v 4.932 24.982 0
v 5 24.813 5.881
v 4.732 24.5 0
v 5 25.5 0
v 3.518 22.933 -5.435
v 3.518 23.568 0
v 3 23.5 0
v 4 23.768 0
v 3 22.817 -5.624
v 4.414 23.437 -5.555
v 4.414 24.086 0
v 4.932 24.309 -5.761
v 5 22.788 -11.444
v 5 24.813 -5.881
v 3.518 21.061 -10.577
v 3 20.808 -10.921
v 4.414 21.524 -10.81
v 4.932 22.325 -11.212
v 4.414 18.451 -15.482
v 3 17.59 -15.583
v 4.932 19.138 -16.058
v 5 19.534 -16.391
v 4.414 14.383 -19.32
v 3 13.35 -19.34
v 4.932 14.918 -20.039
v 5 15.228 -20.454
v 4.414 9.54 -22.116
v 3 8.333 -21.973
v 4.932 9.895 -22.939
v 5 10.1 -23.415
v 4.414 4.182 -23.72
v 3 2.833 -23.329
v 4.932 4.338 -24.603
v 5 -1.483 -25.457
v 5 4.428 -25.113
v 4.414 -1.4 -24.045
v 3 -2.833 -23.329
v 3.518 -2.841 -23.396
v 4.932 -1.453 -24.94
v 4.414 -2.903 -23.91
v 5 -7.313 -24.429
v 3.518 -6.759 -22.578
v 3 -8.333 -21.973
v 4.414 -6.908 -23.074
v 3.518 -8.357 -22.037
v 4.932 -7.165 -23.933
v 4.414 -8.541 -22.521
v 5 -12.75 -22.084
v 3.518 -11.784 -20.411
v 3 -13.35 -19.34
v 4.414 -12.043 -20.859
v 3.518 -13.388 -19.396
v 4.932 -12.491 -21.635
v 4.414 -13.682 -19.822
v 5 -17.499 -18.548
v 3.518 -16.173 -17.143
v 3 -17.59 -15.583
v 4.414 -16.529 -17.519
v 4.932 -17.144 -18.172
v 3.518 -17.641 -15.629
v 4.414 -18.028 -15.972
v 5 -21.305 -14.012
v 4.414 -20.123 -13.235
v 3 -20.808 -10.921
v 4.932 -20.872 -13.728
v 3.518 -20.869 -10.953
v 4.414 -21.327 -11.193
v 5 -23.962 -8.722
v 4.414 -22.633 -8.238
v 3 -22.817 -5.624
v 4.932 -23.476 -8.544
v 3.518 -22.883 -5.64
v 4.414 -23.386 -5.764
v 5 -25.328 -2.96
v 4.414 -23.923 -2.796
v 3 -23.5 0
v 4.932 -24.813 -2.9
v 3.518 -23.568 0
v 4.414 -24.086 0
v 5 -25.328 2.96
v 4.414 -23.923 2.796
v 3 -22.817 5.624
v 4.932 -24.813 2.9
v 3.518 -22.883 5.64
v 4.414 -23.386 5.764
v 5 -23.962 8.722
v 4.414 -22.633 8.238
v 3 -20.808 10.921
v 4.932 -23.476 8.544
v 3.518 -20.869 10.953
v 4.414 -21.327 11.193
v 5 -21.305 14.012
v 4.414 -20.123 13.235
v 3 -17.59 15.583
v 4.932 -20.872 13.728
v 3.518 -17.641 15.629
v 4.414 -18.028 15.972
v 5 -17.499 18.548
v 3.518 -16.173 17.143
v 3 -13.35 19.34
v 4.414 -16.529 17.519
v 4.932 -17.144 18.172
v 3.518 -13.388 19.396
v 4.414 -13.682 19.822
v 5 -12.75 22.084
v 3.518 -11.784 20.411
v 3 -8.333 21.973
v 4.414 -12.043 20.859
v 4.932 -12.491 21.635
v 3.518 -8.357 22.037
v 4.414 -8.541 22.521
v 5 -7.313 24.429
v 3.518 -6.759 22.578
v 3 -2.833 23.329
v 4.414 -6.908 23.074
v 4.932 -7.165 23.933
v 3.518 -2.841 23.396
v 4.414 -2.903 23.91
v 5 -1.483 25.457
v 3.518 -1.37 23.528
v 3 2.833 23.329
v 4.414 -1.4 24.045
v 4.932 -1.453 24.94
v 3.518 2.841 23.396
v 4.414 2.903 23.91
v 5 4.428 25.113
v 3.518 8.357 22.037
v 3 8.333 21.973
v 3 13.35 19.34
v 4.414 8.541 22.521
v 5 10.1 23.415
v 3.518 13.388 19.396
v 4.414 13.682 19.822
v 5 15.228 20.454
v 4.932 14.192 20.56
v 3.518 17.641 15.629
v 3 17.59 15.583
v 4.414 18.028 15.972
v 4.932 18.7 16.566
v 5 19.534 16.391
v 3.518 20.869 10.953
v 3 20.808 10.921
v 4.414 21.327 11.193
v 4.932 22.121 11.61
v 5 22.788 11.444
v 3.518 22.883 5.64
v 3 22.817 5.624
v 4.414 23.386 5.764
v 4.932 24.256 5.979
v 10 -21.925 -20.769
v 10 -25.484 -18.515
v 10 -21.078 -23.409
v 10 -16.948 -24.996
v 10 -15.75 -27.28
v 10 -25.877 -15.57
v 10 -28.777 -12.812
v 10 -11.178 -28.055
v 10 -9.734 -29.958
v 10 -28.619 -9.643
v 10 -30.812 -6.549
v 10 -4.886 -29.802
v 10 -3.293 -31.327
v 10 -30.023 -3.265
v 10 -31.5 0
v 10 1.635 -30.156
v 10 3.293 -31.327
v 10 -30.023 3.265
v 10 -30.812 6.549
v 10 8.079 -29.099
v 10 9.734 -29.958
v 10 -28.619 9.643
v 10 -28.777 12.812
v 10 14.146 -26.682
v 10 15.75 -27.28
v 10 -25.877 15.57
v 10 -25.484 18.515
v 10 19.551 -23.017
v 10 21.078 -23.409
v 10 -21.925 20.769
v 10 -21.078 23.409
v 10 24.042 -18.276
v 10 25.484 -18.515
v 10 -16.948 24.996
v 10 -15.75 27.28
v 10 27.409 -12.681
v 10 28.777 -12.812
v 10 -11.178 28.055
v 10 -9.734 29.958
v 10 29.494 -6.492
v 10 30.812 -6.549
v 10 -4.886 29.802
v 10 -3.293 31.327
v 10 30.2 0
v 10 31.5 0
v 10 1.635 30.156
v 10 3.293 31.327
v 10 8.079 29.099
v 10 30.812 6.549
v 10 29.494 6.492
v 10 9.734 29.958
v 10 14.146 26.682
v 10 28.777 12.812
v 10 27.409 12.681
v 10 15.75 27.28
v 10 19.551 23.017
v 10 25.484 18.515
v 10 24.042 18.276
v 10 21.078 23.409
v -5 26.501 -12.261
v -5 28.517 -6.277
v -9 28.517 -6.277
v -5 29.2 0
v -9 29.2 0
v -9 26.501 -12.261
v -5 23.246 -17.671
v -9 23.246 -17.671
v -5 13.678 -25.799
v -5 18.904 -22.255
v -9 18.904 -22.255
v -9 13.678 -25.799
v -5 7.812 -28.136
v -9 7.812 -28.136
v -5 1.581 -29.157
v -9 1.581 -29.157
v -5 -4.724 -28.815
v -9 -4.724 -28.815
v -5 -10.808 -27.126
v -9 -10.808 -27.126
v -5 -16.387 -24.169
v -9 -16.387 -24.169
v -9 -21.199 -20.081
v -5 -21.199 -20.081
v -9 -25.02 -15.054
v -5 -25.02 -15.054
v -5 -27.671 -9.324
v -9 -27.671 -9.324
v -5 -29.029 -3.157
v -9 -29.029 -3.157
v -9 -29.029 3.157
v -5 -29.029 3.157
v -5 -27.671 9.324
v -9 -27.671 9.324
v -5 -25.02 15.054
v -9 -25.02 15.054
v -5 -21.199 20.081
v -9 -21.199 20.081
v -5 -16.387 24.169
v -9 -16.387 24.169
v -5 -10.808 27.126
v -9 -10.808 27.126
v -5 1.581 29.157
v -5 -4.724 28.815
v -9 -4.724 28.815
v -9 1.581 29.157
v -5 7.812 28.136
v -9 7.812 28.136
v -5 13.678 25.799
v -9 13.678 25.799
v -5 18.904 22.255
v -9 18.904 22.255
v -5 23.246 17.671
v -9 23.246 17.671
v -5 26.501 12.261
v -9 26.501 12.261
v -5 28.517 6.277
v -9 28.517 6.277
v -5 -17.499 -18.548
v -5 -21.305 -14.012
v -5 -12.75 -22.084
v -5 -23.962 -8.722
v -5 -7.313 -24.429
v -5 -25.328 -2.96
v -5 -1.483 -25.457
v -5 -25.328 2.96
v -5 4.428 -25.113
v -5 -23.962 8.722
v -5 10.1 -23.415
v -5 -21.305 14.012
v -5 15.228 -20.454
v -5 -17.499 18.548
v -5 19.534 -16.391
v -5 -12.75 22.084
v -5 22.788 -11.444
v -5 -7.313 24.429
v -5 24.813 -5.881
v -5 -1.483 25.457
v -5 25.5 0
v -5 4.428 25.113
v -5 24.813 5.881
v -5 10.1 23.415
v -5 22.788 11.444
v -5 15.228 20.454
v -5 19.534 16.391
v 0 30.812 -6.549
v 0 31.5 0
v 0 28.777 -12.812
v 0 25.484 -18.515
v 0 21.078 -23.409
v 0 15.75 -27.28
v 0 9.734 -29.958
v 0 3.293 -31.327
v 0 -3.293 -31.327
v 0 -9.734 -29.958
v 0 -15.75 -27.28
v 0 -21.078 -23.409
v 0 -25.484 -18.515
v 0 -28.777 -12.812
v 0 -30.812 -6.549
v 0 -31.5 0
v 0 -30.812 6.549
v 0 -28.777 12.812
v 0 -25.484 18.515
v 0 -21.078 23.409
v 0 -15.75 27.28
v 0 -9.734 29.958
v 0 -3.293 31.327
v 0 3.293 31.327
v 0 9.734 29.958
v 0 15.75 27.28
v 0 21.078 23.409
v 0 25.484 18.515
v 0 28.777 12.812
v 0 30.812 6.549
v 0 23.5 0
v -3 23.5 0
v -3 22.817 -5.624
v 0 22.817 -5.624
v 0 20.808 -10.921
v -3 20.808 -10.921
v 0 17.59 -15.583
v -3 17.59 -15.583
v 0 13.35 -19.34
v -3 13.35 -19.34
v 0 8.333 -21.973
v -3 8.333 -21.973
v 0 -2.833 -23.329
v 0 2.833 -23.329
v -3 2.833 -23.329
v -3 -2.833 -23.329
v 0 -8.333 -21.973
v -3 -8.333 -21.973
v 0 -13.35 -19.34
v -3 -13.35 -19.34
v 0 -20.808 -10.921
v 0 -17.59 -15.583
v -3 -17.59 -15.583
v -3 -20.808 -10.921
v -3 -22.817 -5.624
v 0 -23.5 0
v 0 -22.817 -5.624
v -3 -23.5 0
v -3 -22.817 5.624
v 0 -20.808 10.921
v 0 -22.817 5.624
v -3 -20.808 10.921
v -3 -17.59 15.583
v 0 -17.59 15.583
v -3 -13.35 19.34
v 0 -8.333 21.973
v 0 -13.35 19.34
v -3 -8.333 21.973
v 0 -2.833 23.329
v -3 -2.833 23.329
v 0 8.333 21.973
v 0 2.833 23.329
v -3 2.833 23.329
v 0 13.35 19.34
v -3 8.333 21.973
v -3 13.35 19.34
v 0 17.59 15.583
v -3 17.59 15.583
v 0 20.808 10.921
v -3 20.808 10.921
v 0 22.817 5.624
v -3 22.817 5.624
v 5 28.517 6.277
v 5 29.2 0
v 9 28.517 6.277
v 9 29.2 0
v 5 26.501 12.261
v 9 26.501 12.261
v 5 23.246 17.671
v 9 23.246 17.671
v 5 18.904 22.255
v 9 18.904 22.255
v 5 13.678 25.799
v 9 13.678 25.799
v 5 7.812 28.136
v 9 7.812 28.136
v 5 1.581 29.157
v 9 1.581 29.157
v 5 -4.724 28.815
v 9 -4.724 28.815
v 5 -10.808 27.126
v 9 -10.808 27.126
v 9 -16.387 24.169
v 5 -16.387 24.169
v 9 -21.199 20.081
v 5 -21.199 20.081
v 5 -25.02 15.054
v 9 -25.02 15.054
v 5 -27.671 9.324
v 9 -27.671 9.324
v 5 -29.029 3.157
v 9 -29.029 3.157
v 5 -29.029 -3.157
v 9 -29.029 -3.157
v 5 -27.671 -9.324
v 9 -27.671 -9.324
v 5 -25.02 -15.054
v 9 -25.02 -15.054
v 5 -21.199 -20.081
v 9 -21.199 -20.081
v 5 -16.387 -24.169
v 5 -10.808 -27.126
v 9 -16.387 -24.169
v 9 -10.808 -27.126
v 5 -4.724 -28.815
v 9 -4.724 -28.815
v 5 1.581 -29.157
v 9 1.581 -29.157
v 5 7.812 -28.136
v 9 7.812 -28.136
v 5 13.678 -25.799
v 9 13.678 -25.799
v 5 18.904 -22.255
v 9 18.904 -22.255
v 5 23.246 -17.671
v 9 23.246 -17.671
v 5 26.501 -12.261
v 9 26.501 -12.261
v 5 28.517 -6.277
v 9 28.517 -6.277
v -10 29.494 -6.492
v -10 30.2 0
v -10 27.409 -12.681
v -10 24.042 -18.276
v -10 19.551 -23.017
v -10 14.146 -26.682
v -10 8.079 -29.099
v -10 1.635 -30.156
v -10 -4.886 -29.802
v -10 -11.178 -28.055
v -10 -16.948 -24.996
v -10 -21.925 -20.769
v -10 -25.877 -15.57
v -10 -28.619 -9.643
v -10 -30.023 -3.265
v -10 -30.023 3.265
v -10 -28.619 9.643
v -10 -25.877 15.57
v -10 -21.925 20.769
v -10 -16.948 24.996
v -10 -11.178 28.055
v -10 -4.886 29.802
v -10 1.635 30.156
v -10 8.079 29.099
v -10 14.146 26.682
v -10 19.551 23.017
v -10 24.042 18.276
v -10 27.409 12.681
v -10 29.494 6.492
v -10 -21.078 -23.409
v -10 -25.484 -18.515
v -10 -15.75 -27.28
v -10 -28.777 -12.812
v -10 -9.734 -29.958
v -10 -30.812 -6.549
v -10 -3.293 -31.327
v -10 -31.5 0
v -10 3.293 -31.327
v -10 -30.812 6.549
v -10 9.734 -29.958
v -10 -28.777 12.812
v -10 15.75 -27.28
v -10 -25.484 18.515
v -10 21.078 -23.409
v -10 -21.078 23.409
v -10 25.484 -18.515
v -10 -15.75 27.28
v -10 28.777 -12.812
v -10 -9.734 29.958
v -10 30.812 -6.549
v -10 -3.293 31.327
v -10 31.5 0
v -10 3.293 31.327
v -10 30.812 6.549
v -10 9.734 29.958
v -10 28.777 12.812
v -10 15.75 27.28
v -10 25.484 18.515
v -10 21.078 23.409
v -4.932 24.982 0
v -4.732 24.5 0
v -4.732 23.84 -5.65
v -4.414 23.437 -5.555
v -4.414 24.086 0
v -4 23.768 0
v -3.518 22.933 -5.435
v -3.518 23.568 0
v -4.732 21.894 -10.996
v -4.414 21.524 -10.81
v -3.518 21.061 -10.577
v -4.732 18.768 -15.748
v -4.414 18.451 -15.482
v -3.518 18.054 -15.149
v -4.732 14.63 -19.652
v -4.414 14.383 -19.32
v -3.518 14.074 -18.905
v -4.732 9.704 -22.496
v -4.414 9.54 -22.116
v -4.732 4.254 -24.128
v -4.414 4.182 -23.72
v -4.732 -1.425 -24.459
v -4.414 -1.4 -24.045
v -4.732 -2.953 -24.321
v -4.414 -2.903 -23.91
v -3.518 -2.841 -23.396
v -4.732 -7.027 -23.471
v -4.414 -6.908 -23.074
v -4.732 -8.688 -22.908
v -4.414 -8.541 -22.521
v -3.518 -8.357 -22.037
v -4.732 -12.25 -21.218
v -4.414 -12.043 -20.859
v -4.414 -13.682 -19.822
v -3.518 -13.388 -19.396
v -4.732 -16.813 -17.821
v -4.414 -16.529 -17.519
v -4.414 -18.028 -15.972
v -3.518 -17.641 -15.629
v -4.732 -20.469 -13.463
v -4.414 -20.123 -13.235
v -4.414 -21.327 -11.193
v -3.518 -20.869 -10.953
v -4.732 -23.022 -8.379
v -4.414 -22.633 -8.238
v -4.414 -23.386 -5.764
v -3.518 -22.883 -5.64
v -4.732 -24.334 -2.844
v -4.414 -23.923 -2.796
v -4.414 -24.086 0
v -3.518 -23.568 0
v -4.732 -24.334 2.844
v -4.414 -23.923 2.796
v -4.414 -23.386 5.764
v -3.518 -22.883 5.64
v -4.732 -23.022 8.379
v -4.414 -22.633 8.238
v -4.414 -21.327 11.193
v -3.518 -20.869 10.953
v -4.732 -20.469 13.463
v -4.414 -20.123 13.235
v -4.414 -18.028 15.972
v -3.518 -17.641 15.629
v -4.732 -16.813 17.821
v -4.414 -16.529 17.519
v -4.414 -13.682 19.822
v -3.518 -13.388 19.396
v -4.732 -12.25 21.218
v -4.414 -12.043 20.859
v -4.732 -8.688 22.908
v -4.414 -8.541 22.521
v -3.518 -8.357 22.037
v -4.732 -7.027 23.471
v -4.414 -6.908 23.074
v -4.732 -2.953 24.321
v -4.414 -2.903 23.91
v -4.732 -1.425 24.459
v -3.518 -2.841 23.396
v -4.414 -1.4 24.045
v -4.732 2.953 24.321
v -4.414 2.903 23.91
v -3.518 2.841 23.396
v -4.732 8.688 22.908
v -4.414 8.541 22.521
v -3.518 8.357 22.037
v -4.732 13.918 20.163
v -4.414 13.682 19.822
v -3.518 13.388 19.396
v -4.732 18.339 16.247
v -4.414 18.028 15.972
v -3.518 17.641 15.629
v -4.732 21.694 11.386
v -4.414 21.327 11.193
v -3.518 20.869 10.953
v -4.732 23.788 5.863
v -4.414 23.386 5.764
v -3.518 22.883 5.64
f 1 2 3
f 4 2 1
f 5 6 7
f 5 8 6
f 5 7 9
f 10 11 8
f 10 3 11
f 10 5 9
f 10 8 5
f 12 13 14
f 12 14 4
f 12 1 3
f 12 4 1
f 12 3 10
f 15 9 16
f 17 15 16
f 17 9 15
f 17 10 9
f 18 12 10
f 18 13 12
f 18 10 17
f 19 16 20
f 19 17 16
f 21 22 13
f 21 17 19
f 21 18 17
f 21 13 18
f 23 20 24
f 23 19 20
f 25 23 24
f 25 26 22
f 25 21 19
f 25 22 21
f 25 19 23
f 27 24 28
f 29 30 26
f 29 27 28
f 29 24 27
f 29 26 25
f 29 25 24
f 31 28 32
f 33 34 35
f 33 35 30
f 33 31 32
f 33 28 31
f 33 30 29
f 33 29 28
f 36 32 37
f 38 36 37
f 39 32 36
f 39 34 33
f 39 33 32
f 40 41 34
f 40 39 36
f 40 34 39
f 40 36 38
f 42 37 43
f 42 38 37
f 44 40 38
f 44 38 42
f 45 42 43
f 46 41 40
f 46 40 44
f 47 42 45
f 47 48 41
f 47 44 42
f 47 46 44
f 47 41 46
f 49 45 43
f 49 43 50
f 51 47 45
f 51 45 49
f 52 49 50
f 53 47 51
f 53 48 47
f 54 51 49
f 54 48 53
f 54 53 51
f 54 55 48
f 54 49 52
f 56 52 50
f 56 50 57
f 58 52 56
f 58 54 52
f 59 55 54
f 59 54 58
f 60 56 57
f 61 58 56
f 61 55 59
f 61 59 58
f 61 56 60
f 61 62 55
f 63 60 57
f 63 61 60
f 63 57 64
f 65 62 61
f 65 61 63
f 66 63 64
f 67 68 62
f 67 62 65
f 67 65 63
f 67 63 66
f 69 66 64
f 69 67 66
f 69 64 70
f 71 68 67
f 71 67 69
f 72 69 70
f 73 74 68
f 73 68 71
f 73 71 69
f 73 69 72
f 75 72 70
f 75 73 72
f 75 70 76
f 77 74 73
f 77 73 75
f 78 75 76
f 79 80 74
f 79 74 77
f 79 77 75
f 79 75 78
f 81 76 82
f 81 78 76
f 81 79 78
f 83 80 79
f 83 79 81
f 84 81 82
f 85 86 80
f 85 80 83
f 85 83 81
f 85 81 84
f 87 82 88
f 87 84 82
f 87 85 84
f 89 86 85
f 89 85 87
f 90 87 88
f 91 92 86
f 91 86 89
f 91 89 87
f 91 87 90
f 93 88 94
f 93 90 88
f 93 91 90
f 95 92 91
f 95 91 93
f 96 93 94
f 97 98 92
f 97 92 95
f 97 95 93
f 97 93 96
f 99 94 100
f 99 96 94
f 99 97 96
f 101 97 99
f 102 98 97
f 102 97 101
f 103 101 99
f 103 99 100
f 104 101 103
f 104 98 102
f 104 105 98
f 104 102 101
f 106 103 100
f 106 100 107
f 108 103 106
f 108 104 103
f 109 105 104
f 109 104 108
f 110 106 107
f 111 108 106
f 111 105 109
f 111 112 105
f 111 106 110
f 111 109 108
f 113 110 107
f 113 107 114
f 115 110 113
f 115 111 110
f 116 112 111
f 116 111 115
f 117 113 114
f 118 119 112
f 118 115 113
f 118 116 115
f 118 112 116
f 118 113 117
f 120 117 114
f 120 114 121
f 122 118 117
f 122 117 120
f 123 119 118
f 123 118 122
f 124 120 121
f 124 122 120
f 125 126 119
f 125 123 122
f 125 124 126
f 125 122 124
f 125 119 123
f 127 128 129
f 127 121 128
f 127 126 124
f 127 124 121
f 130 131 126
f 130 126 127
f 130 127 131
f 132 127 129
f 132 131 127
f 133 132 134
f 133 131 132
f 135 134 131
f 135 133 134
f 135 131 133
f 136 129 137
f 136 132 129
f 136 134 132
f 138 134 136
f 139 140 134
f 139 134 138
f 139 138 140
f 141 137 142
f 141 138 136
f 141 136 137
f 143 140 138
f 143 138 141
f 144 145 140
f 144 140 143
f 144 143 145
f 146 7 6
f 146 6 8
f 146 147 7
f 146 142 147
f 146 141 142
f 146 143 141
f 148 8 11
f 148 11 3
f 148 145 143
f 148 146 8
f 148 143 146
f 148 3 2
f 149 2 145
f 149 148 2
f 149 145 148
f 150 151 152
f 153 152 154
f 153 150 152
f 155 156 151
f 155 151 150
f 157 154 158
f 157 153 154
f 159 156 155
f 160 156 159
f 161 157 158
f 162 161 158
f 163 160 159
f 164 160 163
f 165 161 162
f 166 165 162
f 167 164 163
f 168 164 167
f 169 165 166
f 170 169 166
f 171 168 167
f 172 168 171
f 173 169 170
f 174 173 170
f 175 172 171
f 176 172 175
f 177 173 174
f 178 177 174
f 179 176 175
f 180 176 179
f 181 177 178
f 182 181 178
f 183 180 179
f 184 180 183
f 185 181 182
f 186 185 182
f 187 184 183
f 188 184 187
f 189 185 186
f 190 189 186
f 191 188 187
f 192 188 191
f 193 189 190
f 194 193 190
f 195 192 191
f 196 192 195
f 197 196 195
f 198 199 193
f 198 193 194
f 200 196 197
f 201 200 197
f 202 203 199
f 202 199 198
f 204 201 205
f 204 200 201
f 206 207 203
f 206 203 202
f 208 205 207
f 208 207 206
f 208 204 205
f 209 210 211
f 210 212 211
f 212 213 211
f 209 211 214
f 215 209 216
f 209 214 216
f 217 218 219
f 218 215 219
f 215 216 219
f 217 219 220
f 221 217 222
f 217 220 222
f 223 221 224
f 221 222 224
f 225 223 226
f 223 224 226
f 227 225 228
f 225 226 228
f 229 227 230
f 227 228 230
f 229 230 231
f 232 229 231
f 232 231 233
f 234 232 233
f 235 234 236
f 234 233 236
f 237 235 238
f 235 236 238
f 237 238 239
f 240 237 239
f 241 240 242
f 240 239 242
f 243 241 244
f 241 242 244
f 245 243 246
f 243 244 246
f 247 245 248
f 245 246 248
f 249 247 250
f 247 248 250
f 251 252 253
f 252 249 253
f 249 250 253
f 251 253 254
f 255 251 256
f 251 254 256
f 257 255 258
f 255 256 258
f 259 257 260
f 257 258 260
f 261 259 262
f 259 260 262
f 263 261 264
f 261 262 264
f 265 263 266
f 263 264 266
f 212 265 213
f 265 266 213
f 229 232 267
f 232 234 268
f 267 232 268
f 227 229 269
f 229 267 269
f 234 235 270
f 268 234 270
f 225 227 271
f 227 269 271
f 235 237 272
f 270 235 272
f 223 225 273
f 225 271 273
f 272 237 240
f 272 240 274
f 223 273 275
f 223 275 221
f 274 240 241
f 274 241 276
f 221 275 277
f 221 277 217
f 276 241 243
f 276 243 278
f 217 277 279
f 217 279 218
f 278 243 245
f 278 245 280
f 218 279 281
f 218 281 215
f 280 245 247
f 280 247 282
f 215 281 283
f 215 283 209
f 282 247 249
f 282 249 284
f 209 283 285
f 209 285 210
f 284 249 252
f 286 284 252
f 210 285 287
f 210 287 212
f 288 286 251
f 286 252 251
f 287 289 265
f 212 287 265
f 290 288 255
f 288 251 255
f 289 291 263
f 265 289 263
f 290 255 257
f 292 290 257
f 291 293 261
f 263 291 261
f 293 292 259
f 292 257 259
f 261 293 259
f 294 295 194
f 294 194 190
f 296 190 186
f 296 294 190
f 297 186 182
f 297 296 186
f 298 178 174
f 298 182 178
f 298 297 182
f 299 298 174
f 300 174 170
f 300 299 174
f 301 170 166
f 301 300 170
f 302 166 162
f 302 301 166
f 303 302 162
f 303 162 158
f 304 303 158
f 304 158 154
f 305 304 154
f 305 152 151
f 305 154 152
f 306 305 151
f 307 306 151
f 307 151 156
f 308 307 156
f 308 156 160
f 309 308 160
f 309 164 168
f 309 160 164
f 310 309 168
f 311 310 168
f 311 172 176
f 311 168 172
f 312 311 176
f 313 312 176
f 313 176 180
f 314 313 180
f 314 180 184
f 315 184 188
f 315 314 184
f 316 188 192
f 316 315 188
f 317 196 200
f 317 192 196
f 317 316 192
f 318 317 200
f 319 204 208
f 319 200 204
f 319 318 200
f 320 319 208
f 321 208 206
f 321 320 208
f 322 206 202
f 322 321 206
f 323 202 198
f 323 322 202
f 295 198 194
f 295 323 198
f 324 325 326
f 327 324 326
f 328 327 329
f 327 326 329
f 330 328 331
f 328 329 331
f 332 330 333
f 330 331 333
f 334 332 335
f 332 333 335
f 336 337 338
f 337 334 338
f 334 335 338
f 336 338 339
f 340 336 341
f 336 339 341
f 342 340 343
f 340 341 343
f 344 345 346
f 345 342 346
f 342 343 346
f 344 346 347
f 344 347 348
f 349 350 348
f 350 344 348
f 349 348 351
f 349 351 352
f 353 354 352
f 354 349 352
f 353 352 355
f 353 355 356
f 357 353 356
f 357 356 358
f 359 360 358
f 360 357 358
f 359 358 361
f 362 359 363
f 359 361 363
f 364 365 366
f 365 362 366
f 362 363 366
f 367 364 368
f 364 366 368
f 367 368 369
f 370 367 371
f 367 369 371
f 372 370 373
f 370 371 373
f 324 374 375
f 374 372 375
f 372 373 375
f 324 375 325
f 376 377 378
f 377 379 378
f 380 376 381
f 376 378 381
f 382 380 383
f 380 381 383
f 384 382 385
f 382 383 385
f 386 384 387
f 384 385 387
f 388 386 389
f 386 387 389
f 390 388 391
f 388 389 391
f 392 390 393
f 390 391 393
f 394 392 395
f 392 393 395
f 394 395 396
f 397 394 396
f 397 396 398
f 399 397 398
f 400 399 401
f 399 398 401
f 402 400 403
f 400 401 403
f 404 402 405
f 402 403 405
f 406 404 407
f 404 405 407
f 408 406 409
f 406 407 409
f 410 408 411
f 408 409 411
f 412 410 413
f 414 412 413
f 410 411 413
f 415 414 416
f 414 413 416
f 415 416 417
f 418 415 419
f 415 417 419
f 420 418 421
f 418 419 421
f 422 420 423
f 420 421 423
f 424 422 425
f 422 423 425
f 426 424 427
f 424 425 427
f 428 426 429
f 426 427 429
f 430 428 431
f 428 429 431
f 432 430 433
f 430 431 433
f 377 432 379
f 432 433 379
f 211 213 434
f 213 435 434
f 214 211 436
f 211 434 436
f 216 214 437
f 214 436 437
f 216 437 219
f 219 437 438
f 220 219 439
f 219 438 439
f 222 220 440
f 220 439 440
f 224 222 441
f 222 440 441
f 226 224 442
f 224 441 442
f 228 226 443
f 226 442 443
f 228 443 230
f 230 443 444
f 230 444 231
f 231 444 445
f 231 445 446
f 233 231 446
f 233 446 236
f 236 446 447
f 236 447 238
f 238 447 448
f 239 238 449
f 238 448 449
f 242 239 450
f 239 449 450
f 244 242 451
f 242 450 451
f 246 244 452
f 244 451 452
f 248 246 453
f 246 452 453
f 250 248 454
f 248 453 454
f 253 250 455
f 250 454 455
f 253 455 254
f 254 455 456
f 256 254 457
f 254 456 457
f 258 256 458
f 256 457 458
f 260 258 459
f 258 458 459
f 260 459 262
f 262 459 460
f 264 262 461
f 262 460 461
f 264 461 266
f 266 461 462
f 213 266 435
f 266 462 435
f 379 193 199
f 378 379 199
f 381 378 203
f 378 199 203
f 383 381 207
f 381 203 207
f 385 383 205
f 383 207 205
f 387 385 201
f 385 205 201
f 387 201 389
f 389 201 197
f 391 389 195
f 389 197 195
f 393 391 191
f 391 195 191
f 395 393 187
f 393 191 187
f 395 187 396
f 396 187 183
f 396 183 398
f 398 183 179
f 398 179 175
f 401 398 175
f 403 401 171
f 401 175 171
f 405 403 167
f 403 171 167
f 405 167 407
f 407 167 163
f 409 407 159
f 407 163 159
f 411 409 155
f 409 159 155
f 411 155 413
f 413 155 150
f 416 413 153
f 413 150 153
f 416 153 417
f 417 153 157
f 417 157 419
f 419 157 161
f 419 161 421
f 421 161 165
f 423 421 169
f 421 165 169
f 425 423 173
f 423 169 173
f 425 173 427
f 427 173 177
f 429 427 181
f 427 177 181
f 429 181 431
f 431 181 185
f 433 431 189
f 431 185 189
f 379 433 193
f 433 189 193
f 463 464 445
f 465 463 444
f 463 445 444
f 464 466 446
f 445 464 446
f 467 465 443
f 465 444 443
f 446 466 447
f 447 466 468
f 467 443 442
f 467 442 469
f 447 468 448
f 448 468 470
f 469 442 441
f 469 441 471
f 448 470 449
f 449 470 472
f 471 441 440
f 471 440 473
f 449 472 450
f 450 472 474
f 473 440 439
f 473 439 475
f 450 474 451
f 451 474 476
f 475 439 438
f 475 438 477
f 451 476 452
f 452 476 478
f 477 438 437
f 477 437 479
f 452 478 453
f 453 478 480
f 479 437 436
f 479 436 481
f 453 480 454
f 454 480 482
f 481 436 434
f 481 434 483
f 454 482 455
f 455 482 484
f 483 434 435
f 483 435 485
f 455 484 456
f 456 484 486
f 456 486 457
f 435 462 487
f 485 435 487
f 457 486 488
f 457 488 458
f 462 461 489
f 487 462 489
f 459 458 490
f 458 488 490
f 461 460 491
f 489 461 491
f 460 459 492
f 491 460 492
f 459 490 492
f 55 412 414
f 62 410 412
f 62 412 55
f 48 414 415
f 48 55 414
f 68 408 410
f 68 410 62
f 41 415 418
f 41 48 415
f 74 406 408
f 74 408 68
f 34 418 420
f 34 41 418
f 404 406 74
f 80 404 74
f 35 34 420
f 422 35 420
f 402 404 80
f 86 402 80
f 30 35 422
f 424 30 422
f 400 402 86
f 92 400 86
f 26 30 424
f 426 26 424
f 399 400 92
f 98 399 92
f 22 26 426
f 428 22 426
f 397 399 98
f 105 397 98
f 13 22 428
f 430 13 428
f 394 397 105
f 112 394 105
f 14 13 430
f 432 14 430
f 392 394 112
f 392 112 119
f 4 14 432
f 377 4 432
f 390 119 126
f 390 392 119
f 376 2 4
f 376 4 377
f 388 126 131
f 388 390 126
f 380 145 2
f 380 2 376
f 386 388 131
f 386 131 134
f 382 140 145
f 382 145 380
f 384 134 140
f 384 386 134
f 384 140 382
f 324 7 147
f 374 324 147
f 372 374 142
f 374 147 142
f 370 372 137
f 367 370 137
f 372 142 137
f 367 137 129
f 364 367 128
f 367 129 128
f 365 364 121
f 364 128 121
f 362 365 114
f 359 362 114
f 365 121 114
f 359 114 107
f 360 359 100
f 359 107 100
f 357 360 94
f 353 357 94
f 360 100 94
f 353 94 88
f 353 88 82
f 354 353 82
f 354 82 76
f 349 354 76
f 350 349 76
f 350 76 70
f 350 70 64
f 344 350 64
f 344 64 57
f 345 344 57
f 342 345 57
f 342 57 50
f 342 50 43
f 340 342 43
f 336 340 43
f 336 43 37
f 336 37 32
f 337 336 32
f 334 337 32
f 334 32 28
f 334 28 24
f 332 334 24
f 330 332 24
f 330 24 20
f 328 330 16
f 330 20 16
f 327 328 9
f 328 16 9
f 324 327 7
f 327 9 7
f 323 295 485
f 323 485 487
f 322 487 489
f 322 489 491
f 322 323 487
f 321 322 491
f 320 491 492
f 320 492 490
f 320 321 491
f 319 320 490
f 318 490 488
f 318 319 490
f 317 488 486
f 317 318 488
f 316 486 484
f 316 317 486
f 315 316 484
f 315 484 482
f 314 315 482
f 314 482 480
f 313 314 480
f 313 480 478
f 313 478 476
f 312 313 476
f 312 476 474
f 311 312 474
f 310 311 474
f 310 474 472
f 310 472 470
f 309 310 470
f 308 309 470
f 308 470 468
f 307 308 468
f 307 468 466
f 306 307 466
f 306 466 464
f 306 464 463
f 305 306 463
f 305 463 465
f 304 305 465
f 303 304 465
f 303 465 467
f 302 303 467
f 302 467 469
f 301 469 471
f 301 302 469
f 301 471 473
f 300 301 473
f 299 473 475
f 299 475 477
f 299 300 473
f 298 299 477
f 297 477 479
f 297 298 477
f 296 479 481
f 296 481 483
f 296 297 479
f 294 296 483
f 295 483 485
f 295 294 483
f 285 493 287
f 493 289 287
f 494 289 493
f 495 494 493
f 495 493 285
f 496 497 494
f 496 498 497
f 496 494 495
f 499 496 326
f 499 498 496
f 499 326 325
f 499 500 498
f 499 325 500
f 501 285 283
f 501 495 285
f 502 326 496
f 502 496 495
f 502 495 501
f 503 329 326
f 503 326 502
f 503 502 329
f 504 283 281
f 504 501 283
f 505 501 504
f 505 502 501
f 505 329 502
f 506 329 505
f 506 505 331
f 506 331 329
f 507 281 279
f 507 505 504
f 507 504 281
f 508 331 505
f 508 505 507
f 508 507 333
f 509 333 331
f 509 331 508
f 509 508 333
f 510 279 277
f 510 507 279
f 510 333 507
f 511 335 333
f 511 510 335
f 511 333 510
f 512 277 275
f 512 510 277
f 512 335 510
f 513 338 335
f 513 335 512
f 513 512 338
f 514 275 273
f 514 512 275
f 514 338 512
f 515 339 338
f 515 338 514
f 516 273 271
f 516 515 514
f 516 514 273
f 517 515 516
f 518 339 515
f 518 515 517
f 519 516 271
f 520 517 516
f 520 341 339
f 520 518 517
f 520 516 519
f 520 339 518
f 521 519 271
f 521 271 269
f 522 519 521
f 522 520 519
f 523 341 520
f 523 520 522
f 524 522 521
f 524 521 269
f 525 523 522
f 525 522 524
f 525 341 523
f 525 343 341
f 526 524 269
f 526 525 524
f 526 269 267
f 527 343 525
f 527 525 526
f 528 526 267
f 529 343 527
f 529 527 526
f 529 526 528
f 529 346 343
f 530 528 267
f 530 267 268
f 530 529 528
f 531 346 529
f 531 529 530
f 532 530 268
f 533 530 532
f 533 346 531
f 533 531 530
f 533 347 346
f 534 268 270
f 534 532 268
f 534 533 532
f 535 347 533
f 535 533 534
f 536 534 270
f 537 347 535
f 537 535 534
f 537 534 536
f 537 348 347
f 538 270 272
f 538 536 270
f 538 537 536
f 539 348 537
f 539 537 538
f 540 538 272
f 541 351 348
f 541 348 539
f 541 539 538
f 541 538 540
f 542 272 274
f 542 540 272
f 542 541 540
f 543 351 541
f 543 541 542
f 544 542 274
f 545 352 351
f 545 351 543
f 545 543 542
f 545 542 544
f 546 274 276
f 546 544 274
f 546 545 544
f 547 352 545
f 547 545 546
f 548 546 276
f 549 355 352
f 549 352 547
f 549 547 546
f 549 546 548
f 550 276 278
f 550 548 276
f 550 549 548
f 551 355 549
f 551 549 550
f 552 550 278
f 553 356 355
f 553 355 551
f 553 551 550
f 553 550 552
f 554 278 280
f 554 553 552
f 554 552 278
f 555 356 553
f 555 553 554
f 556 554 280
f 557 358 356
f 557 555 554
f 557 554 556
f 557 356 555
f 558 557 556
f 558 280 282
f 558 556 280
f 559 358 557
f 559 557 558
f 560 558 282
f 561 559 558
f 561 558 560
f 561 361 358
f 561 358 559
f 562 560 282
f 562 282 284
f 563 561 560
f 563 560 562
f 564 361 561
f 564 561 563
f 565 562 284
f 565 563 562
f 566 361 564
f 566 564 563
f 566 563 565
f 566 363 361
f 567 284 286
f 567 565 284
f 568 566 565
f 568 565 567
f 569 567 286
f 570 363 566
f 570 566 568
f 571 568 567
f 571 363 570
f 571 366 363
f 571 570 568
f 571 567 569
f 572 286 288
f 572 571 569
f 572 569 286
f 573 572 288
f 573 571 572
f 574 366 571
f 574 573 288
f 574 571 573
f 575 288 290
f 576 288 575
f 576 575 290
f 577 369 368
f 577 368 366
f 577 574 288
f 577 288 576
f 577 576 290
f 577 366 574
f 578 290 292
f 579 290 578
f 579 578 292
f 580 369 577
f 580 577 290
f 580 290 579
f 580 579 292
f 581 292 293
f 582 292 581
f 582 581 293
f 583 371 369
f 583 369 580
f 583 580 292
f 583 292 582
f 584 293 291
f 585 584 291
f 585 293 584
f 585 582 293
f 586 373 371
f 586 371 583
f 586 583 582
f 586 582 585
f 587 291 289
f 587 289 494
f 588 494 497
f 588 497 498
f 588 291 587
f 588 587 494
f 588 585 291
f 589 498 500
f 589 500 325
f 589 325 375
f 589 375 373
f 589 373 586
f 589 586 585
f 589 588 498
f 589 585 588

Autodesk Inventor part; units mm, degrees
ref_plane "YZ Plane" through (0, 0, 0) normal (1, 0, 0) x (0, 1, 0)
ref_plane "XZ Plane" through (0, 0, 0) normal (0, 1, 0) x (-1, 0, 0)
ref_plane "XY Plane" through (0, 0, 0) normal (0, 0, 1) x (1, 0, 0)
sketch "Sketch1" plane through (0, 0, 0) normal (0, 0, 1) x (1, 0, 0)
  line L0 (0, 23.5) -> (3, 23.5)
  line L1 (5, 25.5) -> (5, 29.2)
  line L2 (5, 29.2) -> (10, 29.2)
  line L3 (10, 29.2) -> (10, 31.5)
  line L4 (10, 31.5) -> (0, 31.5)
  line L5 (0, 23.5) -> (0, 39.7331)
  arc A0 (3, 23.5) -> (5, 25.5) centre (3, 25.5) ccw
  line L6 (0, 0) -> (48.7382, 0)
  line L7 (0, 23.5) -> (-3, 23.5)
  line L8 (-5, 25.5) -> (-5, 29.2)
  line L9 (-5, 29.2) -> (-10, 29.2)
  line L10 (-10, 29.2) -> (-10, 31.5)
  line L11 (-10, 31.5) -> (0, 31.5)
  arc A1 (-5, 25.5) -> (-3, 23.5) centre (-3, 25.5) ccw
  dimension "d0" = 2
  dimension "d1" = 47
  dimension "d2" = 63
  dimension "d3" = 58.4
  dimension "d4" = 10
  dimension "d7" = 10
revolve "Revolution1" add sketch "Sketch1" angle 360 about axis through (0, 0, 0) along (1, 0, 0)
chamfer "Fase1" distance 1 angle 45 1 edges at (10, -29.2, 0)
chamfer "Fase2" distance 1 angle 45 1 edges at (-10, -29.2, 0)
properties part number "Plunger_Seal" material "Nylon-6/6"
